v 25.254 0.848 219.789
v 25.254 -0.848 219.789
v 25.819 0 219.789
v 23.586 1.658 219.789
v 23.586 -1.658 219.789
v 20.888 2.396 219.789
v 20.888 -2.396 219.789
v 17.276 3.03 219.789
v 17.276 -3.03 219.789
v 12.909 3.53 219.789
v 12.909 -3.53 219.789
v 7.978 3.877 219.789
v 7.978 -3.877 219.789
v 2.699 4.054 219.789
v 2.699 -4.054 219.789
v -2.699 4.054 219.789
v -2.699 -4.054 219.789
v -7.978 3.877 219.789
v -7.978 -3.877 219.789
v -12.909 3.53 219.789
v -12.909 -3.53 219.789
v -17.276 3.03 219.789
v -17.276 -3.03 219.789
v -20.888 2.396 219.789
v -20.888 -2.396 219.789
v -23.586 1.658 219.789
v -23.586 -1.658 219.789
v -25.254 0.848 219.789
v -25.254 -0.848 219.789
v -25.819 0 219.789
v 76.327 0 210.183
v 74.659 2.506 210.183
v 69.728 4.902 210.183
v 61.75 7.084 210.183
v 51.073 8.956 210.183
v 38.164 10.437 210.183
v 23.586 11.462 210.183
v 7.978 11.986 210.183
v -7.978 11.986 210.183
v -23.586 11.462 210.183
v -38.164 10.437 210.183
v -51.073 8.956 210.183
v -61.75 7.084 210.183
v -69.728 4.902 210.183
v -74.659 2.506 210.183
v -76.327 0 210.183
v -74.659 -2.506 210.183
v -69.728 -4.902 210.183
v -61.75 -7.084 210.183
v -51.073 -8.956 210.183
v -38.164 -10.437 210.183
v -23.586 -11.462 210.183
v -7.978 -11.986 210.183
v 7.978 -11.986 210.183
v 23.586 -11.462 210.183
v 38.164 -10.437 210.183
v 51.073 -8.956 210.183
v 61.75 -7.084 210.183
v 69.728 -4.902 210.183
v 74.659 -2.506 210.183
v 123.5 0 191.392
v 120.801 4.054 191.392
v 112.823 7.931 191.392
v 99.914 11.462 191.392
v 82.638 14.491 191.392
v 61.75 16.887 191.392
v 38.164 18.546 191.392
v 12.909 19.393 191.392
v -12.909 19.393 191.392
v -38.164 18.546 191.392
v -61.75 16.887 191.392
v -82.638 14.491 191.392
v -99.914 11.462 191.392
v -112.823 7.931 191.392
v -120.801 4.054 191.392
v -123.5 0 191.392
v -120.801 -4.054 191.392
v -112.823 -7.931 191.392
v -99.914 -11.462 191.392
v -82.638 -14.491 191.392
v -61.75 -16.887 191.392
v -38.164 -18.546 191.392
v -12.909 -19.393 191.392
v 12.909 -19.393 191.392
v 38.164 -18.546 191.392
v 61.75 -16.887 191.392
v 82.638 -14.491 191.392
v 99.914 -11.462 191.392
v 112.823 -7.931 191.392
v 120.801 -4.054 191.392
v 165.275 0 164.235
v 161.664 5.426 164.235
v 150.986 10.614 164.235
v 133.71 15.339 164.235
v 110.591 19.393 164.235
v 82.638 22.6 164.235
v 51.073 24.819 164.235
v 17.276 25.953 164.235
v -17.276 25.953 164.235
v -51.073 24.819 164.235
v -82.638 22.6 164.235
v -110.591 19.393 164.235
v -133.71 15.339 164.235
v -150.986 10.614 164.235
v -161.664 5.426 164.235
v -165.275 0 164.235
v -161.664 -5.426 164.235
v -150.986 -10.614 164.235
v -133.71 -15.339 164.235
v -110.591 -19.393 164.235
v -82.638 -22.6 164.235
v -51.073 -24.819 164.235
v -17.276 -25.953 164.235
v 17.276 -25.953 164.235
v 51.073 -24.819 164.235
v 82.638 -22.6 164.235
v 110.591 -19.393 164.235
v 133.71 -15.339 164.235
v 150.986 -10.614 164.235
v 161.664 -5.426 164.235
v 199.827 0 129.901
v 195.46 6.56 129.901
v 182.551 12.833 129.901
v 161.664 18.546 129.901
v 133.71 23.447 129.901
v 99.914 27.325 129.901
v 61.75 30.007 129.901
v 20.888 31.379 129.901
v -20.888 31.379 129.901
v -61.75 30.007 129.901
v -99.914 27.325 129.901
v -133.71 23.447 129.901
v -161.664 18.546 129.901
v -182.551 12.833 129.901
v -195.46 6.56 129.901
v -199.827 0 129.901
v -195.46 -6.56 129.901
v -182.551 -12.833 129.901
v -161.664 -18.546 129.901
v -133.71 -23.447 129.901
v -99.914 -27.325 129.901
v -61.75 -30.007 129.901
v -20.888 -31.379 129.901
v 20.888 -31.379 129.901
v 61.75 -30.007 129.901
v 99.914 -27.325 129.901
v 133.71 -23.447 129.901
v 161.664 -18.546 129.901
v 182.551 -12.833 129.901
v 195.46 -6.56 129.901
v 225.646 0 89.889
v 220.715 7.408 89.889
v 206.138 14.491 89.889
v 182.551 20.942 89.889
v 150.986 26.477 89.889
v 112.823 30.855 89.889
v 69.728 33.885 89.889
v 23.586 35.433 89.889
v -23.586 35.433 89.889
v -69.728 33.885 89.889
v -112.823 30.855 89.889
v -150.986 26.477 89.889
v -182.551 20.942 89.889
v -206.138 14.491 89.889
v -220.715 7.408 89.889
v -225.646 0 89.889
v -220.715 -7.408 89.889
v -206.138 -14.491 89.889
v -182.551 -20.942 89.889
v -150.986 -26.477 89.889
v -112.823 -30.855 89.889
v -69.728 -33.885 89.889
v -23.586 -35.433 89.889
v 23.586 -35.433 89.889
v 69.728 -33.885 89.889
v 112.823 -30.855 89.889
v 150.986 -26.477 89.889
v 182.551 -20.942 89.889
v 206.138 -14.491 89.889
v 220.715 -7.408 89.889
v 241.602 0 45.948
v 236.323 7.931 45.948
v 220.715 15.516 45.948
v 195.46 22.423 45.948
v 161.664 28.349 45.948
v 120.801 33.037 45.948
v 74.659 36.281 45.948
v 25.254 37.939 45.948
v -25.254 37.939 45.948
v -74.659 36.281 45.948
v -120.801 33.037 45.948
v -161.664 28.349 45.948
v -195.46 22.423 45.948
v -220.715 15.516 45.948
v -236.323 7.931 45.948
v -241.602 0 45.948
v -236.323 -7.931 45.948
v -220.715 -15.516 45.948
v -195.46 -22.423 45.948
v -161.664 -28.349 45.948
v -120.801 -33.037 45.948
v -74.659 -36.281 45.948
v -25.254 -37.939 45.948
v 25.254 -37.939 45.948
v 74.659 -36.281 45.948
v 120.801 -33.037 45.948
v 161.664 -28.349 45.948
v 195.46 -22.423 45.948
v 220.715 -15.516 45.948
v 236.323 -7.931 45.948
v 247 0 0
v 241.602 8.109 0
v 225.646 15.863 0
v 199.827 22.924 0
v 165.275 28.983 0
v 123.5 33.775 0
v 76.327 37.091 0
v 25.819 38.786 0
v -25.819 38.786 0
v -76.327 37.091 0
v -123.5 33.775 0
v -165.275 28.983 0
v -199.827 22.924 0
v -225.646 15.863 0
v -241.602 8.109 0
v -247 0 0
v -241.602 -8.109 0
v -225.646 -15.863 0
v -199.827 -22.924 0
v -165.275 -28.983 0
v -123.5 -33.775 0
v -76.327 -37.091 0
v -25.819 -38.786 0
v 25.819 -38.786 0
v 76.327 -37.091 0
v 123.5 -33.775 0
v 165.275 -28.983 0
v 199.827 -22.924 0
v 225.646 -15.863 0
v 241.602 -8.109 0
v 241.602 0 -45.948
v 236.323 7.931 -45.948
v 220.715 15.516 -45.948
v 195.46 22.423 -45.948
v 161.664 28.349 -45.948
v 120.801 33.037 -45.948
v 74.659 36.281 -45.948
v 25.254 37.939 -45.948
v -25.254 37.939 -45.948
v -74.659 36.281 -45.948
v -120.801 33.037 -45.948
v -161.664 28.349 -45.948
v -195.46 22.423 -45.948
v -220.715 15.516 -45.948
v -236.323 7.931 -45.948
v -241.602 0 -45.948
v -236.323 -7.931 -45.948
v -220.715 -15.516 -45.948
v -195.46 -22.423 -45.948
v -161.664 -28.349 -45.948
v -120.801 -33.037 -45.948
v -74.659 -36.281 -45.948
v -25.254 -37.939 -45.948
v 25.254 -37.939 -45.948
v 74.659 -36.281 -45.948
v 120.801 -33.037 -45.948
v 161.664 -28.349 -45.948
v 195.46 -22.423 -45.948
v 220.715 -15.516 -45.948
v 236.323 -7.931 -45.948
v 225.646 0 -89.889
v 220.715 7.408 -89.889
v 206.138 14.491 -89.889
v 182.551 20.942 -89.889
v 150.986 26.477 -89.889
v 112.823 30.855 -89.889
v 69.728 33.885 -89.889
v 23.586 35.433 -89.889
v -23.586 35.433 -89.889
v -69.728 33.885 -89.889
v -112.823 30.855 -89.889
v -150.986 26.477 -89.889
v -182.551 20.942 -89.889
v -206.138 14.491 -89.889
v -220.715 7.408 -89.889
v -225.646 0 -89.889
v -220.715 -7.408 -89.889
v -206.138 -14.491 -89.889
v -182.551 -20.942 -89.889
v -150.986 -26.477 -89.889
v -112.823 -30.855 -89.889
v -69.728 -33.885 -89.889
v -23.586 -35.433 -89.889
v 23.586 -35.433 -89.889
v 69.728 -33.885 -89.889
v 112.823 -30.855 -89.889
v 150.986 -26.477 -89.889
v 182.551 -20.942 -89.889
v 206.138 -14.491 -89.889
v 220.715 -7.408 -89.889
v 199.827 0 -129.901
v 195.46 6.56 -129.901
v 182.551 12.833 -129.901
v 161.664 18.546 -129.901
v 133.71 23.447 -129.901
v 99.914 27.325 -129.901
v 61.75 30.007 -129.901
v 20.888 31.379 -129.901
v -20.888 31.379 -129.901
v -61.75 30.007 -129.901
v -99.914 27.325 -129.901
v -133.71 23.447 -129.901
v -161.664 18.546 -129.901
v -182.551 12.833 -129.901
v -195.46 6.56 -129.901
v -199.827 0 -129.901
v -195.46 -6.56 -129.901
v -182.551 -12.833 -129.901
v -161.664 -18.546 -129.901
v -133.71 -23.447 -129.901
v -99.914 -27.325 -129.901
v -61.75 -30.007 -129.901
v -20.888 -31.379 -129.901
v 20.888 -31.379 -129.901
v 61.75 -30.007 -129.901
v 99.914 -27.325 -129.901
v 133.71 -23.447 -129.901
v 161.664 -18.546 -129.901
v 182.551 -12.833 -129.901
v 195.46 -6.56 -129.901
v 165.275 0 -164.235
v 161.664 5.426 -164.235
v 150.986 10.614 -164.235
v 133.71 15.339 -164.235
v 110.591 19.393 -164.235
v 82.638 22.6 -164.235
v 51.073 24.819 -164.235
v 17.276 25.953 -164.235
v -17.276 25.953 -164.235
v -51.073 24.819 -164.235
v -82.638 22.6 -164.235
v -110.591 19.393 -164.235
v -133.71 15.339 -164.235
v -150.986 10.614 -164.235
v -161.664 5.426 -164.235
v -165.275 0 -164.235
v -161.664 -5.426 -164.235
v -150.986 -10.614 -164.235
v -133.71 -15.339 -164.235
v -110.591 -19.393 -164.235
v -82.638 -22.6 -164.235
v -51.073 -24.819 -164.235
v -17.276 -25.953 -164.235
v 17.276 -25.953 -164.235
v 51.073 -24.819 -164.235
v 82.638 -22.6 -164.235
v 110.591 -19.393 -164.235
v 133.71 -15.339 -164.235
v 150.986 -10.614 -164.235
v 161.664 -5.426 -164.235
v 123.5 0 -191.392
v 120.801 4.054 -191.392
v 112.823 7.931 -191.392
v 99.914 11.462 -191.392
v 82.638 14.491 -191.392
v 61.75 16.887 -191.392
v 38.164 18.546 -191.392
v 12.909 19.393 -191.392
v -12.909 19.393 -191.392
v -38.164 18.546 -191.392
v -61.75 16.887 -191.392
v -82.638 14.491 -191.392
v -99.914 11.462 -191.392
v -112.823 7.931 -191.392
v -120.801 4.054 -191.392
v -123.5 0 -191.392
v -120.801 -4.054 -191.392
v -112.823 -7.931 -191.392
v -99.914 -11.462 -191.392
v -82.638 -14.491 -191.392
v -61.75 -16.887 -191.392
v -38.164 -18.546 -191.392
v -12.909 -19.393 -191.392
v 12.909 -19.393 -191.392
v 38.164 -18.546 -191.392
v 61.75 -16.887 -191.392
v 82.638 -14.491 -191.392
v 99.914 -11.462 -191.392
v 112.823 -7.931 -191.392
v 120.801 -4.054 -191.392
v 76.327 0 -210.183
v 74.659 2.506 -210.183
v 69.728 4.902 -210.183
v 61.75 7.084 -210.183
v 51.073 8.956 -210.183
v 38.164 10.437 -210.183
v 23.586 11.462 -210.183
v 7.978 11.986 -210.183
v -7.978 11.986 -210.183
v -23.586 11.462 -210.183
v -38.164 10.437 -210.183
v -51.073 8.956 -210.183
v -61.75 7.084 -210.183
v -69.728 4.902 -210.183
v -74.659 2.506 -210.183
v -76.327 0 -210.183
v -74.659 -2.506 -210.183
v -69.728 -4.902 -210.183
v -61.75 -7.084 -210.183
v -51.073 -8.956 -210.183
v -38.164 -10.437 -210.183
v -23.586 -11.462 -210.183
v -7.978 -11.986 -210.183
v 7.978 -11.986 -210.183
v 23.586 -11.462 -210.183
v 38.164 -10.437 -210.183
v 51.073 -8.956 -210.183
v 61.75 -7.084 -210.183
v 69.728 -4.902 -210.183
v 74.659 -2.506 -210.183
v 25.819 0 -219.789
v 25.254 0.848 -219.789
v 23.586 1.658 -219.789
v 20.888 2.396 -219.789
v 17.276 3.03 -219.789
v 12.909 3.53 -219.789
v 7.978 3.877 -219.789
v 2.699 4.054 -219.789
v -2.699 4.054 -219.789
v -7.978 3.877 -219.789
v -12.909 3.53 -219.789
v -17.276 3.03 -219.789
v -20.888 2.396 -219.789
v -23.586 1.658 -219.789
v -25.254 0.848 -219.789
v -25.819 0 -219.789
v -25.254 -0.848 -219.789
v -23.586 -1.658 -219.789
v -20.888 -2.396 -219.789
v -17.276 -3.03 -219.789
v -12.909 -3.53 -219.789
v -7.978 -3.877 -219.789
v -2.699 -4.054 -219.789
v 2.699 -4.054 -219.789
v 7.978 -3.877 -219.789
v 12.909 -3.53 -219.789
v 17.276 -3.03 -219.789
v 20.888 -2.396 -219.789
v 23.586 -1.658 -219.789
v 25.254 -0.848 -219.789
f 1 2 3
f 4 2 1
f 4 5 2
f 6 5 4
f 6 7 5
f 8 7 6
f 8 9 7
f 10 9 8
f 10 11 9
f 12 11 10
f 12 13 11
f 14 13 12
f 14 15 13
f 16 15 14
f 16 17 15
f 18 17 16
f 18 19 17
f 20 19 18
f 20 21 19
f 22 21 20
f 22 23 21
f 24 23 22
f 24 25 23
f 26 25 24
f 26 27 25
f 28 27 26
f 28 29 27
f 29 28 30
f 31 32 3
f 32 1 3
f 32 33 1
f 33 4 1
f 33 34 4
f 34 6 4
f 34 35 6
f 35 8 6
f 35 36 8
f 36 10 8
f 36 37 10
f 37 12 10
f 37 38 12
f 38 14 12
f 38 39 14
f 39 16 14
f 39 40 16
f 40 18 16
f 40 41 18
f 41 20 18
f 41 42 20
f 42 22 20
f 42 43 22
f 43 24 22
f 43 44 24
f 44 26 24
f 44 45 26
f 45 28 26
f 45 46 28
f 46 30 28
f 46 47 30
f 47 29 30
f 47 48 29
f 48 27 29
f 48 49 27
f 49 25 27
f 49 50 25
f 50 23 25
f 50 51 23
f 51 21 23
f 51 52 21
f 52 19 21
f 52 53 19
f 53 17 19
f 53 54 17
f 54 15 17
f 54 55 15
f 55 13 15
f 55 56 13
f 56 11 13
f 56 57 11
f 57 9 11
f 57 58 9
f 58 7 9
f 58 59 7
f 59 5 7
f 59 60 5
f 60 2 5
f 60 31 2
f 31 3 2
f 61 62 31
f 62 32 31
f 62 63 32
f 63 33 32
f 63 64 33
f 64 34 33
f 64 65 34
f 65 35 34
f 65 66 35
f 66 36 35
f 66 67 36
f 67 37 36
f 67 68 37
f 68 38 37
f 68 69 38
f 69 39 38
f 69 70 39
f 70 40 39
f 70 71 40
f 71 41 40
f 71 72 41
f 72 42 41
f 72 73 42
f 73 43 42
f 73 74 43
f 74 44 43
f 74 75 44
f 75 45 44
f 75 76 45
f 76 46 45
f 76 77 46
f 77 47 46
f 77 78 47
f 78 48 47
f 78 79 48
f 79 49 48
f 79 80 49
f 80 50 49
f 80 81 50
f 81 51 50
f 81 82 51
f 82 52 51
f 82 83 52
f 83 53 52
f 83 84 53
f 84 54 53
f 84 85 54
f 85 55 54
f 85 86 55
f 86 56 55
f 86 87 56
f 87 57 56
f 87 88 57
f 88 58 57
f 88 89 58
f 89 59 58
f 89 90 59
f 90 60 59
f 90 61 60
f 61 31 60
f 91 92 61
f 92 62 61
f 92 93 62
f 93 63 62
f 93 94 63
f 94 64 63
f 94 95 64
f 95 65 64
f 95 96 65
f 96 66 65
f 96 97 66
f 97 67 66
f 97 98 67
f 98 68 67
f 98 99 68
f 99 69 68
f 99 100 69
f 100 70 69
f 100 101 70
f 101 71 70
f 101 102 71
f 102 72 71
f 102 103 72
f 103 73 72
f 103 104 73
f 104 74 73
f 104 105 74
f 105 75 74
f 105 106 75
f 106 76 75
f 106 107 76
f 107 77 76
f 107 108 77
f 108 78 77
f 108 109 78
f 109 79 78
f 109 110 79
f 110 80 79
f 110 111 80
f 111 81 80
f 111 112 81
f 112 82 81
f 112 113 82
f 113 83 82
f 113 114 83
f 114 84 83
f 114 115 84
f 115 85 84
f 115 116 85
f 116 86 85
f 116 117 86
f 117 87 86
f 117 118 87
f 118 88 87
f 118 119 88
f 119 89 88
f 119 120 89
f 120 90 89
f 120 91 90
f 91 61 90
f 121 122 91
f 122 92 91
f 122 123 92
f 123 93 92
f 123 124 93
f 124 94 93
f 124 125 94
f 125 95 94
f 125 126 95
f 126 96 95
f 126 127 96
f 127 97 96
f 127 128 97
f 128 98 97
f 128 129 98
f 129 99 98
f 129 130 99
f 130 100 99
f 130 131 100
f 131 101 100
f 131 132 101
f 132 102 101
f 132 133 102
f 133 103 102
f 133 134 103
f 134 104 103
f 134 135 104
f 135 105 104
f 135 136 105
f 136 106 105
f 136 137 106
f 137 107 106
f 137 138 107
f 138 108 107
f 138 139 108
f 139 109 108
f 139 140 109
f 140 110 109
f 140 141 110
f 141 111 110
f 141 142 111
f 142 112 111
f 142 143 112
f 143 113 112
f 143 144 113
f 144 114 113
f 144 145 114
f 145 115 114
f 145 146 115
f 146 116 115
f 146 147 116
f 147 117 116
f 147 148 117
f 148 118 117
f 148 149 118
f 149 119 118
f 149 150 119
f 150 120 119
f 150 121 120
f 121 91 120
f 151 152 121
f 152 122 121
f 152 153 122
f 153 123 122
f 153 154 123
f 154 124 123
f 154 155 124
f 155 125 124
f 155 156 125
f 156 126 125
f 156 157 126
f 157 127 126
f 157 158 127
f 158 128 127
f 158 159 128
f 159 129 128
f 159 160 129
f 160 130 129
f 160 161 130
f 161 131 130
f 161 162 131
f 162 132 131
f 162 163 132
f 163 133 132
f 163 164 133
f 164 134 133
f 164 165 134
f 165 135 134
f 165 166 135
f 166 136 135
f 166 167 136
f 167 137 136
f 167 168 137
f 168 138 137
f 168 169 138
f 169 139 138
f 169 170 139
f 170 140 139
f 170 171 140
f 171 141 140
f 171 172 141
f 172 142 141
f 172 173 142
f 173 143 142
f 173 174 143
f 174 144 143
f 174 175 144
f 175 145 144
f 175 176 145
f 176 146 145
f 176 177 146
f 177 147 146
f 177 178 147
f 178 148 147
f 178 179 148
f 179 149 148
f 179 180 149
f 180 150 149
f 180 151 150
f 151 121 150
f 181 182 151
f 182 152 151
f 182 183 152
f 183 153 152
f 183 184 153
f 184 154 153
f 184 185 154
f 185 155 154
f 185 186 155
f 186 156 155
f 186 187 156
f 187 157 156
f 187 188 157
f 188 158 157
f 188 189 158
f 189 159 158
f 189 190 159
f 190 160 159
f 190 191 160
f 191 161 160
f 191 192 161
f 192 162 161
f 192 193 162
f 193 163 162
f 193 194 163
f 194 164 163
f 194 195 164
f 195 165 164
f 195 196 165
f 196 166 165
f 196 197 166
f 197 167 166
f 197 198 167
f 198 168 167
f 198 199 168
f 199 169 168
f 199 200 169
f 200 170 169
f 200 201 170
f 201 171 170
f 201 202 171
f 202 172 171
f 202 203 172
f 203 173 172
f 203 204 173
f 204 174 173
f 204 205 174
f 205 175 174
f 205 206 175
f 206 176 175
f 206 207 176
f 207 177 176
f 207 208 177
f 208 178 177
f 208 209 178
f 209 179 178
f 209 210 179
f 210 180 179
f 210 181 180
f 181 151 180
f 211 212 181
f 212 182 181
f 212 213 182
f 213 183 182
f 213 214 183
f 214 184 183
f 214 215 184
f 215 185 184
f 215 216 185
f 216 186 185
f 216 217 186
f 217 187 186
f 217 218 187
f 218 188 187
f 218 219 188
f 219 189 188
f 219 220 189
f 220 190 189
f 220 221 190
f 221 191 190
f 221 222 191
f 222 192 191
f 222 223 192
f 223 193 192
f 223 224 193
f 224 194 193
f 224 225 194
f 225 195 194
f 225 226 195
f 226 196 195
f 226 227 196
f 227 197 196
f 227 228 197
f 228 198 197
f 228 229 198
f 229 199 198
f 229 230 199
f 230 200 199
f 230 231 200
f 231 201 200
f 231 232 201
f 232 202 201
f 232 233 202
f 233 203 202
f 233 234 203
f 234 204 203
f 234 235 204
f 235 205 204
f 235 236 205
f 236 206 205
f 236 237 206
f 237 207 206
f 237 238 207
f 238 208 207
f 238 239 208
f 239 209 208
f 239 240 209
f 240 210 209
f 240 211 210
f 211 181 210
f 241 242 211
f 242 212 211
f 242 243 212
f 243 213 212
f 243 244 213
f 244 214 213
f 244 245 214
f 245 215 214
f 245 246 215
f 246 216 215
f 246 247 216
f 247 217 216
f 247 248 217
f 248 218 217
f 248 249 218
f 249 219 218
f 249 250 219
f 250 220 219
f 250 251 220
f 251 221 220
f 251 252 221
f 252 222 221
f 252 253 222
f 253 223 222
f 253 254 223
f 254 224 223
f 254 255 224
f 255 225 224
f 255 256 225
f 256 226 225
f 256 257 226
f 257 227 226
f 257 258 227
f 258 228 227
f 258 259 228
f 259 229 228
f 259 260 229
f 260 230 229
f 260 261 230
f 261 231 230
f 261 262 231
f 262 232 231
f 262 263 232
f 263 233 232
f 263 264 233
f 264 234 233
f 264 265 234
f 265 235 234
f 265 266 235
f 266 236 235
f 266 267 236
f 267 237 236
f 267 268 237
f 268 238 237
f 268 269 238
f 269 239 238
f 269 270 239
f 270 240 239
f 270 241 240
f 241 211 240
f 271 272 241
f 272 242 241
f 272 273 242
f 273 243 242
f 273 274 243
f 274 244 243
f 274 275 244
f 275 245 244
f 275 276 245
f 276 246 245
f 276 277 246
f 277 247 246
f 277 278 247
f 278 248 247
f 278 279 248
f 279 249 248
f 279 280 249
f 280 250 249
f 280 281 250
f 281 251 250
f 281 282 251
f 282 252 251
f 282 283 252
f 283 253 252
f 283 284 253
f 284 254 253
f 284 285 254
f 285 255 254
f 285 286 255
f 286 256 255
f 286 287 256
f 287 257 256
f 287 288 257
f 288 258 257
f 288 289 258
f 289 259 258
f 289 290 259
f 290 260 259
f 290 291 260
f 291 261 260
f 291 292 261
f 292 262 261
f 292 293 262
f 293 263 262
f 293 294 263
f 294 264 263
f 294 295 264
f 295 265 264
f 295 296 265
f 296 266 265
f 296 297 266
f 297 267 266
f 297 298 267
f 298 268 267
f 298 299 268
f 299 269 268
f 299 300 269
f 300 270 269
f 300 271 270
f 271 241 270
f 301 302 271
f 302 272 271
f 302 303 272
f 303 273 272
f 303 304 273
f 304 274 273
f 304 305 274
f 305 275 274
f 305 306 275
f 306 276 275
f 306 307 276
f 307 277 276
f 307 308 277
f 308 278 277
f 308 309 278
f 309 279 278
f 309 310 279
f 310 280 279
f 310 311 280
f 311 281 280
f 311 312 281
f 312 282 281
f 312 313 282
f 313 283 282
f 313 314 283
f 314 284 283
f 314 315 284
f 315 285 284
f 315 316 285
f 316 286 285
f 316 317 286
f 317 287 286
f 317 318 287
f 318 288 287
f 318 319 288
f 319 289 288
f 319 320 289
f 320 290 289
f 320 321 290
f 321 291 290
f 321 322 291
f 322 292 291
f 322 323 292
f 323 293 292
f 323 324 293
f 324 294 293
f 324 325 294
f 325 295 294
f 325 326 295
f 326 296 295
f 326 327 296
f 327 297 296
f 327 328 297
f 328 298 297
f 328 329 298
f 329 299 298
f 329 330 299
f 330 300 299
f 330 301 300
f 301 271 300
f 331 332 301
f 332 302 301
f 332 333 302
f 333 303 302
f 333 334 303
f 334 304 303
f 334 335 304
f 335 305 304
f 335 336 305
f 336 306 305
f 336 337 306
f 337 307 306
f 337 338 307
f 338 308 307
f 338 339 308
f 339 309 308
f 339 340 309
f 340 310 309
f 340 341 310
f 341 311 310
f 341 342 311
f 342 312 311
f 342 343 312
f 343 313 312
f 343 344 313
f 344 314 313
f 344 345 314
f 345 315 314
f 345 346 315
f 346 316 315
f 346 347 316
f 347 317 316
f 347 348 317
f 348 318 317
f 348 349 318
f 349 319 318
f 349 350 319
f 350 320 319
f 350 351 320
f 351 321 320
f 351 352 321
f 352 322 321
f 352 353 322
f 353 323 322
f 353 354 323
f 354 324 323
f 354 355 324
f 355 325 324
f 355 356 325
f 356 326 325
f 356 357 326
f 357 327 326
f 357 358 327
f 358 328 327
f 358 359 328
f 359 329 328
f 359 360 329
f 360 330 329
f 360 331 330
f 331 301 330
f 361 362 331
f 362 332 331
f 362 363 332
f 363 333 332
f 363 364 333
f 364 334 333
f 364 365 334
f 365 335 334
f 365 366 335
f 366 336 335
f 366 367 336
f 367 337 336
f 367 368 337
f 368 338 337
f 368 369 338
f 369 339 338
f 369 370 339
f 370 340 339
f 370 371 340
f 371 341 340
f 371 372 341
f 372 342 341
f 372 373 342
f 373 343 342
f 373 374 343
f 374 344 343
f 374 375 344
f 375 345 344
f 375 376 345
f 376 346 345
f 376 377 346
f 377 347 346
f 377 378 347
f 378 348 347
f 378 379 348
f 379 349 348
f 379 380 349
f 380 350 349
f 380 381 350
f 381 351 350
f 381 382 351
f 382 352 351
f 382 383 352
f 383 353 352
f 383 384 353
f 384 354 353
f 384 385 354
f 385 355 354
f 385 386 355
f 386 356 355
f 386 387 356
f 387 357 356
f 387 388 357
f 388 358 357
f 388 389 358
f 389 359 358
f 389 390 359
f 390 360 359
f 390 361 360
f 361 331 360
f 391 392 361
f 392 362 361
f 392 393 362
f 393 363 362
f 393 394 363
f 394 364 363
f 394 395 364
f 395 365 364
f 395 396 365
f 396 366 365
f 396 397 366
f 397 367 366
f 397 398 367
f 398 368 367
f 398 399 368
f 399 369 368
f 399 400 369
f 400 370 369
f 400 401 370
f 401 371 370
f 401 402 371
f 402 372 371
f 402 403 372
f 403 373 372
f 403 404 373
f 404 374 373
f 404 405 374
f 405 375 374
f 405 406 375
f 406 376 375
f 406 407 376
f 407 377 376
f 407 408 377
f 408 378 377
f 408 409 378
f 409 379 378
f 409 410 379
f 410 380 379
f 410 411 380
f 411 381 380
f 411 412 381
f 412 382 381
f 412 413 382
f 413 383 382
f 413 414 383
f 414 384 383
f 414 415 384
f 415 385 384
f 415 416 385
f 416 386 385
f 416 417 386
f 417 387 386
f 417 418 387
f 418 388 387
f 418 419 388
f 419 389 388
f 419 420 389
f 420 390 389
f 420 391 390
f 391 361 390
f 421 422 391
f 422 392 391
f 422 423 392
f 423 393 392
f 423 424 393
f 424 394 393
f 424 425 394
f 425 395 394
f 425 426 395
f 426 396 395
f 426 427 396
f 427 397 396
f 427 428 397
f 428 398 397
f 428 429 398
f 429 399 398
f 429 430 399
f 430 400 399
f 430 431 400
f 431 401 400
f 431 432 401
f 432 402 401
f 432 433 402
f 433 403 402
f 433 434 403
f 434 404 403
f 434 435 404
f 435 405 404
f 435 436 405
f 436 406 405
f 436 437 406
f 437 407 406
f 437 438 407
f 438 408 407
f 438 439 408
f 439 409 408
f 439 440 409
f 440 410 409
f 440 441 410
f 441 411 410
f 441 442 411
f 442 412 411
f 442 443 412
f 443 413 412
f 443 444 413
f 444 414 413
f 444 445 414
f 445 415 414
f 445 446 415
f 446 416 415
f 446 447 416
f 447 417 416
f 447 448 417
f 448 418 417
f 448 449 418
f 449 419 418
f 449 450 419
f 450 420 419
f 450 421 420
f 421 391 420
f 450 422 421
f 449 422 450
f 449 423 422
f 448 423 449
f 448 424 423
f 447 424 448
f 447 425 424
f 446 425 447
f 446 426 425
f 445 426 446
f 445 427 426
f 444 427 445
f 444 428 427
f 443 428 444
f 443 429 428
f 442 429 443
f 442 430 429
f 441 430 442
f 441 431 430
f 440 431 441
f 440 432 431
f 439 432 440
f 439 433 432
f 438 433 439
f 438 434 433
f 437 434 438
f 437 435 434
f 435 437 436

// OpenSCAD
// Generated by SolidPython 1.0.1 on 2020-07-29 00:46:53


scale(v = [19, 3, 17]) {
	sphere(r = 13);
}
/***********************************************
*********      SolidPython code:      **********
************************************************
 
# import packages: SolidPython
from solid import *
from solid.utils import *
from itertools import chain, combinations, permutations


class Resize:

    def __init__(self, scad_file):
        self.scad_file = scad_file
        #self.scad_file = import_scad(scad_file)
        # cone/cylinder param:
        self.r1 = 0
        self.r2 = 0
        self.h = 0
        # rectangular prism param:
        self.w = 0
        self.l = 0
        # ellipse param:
        self.r = 0

    # import OpenScad code (file name corresponds to shape)


    # classify shape + parameters
    def assign(self, param1, param2, param3):
        if self.scad_file == 'cone.scad':
            self.r1 = param1
            self.r2 = param2
            self.h = param3
        elif self.scad_file == 'cylinder.scad':
            self.r1 = param1
            self.r2 = param2
            self.h = param3
        elif self.scad_file == 'rectangularPrism.scad':
            self.h = param1
            self.l = param2
            self.w = param3
        else:
            self.r = param1
            self.h = param2

    # resize parameters
    def iterate(self):
        x = range(3, 20, 2)
        i = 1
        if self.scad_file == 'cone.scad':
            tempList = list(permutations(x, 2))
            for temp in tempList:
                param1 = temp[0]
                param2 = temp[1]
                filepath = 'produced_scad_files/' + 'cone' + str(param1) + '_' + str(param2) + '_' + '.scad'
                scad_render_to_file(cylinder(h=param1, r1=param2, r2=0), filepath)

        elif self.scad_file == 'cylinder.scad':
            tempList = list(permutations(x, 3))
            for temp in tempList:
                param1 = temp[0]
                param2 = temp[1]
                filepath = 'produced_scad_files/' + 'cylinder' + str(param1) + '_' + str(param2) + '_' + '.scad'
                scad_render_to_file(cylinder(h=param1, r1=param2, r2=param2), filepath)

        elif self.scad_file == 'rectangularPrism.scad':
            tempList = list(permutations(x, 3))
            for temp in tempList:
                param1 = temp[0]
                param2 = temp[1]
                param3 = temp[2]
                filepath = 'produced_scad_files/' + 'rectangularPrism' + str(param1) + '_' + str(param2) + '_' + str(
                    param3) + '.scad'
                scad_render_to_file(cube(size=(param1, param2, param3)), filepath)

        elif self.scad_file == 'ellipse.scad':
            tempList = list(permutations(x, 4))
            for temp in tempList:
                param1 = temp[0]
                param2 = temp[1]
                param3 = temp[2]
                param4 = temp[3]
                filepath = 'produced_scad_files/' + 'ellipse' + str(param1) + '_' + str(param2) + '_' + str(param3) + '_' + str(param4) + '.scad'
                scad_render_to_file(scale([param1, param2, param3])(sphere(r=param4)), filepath)

    def render_to_scadfile(self):
        scad_render_to_file(scad, 'example.scad') 
 
************************************************/
